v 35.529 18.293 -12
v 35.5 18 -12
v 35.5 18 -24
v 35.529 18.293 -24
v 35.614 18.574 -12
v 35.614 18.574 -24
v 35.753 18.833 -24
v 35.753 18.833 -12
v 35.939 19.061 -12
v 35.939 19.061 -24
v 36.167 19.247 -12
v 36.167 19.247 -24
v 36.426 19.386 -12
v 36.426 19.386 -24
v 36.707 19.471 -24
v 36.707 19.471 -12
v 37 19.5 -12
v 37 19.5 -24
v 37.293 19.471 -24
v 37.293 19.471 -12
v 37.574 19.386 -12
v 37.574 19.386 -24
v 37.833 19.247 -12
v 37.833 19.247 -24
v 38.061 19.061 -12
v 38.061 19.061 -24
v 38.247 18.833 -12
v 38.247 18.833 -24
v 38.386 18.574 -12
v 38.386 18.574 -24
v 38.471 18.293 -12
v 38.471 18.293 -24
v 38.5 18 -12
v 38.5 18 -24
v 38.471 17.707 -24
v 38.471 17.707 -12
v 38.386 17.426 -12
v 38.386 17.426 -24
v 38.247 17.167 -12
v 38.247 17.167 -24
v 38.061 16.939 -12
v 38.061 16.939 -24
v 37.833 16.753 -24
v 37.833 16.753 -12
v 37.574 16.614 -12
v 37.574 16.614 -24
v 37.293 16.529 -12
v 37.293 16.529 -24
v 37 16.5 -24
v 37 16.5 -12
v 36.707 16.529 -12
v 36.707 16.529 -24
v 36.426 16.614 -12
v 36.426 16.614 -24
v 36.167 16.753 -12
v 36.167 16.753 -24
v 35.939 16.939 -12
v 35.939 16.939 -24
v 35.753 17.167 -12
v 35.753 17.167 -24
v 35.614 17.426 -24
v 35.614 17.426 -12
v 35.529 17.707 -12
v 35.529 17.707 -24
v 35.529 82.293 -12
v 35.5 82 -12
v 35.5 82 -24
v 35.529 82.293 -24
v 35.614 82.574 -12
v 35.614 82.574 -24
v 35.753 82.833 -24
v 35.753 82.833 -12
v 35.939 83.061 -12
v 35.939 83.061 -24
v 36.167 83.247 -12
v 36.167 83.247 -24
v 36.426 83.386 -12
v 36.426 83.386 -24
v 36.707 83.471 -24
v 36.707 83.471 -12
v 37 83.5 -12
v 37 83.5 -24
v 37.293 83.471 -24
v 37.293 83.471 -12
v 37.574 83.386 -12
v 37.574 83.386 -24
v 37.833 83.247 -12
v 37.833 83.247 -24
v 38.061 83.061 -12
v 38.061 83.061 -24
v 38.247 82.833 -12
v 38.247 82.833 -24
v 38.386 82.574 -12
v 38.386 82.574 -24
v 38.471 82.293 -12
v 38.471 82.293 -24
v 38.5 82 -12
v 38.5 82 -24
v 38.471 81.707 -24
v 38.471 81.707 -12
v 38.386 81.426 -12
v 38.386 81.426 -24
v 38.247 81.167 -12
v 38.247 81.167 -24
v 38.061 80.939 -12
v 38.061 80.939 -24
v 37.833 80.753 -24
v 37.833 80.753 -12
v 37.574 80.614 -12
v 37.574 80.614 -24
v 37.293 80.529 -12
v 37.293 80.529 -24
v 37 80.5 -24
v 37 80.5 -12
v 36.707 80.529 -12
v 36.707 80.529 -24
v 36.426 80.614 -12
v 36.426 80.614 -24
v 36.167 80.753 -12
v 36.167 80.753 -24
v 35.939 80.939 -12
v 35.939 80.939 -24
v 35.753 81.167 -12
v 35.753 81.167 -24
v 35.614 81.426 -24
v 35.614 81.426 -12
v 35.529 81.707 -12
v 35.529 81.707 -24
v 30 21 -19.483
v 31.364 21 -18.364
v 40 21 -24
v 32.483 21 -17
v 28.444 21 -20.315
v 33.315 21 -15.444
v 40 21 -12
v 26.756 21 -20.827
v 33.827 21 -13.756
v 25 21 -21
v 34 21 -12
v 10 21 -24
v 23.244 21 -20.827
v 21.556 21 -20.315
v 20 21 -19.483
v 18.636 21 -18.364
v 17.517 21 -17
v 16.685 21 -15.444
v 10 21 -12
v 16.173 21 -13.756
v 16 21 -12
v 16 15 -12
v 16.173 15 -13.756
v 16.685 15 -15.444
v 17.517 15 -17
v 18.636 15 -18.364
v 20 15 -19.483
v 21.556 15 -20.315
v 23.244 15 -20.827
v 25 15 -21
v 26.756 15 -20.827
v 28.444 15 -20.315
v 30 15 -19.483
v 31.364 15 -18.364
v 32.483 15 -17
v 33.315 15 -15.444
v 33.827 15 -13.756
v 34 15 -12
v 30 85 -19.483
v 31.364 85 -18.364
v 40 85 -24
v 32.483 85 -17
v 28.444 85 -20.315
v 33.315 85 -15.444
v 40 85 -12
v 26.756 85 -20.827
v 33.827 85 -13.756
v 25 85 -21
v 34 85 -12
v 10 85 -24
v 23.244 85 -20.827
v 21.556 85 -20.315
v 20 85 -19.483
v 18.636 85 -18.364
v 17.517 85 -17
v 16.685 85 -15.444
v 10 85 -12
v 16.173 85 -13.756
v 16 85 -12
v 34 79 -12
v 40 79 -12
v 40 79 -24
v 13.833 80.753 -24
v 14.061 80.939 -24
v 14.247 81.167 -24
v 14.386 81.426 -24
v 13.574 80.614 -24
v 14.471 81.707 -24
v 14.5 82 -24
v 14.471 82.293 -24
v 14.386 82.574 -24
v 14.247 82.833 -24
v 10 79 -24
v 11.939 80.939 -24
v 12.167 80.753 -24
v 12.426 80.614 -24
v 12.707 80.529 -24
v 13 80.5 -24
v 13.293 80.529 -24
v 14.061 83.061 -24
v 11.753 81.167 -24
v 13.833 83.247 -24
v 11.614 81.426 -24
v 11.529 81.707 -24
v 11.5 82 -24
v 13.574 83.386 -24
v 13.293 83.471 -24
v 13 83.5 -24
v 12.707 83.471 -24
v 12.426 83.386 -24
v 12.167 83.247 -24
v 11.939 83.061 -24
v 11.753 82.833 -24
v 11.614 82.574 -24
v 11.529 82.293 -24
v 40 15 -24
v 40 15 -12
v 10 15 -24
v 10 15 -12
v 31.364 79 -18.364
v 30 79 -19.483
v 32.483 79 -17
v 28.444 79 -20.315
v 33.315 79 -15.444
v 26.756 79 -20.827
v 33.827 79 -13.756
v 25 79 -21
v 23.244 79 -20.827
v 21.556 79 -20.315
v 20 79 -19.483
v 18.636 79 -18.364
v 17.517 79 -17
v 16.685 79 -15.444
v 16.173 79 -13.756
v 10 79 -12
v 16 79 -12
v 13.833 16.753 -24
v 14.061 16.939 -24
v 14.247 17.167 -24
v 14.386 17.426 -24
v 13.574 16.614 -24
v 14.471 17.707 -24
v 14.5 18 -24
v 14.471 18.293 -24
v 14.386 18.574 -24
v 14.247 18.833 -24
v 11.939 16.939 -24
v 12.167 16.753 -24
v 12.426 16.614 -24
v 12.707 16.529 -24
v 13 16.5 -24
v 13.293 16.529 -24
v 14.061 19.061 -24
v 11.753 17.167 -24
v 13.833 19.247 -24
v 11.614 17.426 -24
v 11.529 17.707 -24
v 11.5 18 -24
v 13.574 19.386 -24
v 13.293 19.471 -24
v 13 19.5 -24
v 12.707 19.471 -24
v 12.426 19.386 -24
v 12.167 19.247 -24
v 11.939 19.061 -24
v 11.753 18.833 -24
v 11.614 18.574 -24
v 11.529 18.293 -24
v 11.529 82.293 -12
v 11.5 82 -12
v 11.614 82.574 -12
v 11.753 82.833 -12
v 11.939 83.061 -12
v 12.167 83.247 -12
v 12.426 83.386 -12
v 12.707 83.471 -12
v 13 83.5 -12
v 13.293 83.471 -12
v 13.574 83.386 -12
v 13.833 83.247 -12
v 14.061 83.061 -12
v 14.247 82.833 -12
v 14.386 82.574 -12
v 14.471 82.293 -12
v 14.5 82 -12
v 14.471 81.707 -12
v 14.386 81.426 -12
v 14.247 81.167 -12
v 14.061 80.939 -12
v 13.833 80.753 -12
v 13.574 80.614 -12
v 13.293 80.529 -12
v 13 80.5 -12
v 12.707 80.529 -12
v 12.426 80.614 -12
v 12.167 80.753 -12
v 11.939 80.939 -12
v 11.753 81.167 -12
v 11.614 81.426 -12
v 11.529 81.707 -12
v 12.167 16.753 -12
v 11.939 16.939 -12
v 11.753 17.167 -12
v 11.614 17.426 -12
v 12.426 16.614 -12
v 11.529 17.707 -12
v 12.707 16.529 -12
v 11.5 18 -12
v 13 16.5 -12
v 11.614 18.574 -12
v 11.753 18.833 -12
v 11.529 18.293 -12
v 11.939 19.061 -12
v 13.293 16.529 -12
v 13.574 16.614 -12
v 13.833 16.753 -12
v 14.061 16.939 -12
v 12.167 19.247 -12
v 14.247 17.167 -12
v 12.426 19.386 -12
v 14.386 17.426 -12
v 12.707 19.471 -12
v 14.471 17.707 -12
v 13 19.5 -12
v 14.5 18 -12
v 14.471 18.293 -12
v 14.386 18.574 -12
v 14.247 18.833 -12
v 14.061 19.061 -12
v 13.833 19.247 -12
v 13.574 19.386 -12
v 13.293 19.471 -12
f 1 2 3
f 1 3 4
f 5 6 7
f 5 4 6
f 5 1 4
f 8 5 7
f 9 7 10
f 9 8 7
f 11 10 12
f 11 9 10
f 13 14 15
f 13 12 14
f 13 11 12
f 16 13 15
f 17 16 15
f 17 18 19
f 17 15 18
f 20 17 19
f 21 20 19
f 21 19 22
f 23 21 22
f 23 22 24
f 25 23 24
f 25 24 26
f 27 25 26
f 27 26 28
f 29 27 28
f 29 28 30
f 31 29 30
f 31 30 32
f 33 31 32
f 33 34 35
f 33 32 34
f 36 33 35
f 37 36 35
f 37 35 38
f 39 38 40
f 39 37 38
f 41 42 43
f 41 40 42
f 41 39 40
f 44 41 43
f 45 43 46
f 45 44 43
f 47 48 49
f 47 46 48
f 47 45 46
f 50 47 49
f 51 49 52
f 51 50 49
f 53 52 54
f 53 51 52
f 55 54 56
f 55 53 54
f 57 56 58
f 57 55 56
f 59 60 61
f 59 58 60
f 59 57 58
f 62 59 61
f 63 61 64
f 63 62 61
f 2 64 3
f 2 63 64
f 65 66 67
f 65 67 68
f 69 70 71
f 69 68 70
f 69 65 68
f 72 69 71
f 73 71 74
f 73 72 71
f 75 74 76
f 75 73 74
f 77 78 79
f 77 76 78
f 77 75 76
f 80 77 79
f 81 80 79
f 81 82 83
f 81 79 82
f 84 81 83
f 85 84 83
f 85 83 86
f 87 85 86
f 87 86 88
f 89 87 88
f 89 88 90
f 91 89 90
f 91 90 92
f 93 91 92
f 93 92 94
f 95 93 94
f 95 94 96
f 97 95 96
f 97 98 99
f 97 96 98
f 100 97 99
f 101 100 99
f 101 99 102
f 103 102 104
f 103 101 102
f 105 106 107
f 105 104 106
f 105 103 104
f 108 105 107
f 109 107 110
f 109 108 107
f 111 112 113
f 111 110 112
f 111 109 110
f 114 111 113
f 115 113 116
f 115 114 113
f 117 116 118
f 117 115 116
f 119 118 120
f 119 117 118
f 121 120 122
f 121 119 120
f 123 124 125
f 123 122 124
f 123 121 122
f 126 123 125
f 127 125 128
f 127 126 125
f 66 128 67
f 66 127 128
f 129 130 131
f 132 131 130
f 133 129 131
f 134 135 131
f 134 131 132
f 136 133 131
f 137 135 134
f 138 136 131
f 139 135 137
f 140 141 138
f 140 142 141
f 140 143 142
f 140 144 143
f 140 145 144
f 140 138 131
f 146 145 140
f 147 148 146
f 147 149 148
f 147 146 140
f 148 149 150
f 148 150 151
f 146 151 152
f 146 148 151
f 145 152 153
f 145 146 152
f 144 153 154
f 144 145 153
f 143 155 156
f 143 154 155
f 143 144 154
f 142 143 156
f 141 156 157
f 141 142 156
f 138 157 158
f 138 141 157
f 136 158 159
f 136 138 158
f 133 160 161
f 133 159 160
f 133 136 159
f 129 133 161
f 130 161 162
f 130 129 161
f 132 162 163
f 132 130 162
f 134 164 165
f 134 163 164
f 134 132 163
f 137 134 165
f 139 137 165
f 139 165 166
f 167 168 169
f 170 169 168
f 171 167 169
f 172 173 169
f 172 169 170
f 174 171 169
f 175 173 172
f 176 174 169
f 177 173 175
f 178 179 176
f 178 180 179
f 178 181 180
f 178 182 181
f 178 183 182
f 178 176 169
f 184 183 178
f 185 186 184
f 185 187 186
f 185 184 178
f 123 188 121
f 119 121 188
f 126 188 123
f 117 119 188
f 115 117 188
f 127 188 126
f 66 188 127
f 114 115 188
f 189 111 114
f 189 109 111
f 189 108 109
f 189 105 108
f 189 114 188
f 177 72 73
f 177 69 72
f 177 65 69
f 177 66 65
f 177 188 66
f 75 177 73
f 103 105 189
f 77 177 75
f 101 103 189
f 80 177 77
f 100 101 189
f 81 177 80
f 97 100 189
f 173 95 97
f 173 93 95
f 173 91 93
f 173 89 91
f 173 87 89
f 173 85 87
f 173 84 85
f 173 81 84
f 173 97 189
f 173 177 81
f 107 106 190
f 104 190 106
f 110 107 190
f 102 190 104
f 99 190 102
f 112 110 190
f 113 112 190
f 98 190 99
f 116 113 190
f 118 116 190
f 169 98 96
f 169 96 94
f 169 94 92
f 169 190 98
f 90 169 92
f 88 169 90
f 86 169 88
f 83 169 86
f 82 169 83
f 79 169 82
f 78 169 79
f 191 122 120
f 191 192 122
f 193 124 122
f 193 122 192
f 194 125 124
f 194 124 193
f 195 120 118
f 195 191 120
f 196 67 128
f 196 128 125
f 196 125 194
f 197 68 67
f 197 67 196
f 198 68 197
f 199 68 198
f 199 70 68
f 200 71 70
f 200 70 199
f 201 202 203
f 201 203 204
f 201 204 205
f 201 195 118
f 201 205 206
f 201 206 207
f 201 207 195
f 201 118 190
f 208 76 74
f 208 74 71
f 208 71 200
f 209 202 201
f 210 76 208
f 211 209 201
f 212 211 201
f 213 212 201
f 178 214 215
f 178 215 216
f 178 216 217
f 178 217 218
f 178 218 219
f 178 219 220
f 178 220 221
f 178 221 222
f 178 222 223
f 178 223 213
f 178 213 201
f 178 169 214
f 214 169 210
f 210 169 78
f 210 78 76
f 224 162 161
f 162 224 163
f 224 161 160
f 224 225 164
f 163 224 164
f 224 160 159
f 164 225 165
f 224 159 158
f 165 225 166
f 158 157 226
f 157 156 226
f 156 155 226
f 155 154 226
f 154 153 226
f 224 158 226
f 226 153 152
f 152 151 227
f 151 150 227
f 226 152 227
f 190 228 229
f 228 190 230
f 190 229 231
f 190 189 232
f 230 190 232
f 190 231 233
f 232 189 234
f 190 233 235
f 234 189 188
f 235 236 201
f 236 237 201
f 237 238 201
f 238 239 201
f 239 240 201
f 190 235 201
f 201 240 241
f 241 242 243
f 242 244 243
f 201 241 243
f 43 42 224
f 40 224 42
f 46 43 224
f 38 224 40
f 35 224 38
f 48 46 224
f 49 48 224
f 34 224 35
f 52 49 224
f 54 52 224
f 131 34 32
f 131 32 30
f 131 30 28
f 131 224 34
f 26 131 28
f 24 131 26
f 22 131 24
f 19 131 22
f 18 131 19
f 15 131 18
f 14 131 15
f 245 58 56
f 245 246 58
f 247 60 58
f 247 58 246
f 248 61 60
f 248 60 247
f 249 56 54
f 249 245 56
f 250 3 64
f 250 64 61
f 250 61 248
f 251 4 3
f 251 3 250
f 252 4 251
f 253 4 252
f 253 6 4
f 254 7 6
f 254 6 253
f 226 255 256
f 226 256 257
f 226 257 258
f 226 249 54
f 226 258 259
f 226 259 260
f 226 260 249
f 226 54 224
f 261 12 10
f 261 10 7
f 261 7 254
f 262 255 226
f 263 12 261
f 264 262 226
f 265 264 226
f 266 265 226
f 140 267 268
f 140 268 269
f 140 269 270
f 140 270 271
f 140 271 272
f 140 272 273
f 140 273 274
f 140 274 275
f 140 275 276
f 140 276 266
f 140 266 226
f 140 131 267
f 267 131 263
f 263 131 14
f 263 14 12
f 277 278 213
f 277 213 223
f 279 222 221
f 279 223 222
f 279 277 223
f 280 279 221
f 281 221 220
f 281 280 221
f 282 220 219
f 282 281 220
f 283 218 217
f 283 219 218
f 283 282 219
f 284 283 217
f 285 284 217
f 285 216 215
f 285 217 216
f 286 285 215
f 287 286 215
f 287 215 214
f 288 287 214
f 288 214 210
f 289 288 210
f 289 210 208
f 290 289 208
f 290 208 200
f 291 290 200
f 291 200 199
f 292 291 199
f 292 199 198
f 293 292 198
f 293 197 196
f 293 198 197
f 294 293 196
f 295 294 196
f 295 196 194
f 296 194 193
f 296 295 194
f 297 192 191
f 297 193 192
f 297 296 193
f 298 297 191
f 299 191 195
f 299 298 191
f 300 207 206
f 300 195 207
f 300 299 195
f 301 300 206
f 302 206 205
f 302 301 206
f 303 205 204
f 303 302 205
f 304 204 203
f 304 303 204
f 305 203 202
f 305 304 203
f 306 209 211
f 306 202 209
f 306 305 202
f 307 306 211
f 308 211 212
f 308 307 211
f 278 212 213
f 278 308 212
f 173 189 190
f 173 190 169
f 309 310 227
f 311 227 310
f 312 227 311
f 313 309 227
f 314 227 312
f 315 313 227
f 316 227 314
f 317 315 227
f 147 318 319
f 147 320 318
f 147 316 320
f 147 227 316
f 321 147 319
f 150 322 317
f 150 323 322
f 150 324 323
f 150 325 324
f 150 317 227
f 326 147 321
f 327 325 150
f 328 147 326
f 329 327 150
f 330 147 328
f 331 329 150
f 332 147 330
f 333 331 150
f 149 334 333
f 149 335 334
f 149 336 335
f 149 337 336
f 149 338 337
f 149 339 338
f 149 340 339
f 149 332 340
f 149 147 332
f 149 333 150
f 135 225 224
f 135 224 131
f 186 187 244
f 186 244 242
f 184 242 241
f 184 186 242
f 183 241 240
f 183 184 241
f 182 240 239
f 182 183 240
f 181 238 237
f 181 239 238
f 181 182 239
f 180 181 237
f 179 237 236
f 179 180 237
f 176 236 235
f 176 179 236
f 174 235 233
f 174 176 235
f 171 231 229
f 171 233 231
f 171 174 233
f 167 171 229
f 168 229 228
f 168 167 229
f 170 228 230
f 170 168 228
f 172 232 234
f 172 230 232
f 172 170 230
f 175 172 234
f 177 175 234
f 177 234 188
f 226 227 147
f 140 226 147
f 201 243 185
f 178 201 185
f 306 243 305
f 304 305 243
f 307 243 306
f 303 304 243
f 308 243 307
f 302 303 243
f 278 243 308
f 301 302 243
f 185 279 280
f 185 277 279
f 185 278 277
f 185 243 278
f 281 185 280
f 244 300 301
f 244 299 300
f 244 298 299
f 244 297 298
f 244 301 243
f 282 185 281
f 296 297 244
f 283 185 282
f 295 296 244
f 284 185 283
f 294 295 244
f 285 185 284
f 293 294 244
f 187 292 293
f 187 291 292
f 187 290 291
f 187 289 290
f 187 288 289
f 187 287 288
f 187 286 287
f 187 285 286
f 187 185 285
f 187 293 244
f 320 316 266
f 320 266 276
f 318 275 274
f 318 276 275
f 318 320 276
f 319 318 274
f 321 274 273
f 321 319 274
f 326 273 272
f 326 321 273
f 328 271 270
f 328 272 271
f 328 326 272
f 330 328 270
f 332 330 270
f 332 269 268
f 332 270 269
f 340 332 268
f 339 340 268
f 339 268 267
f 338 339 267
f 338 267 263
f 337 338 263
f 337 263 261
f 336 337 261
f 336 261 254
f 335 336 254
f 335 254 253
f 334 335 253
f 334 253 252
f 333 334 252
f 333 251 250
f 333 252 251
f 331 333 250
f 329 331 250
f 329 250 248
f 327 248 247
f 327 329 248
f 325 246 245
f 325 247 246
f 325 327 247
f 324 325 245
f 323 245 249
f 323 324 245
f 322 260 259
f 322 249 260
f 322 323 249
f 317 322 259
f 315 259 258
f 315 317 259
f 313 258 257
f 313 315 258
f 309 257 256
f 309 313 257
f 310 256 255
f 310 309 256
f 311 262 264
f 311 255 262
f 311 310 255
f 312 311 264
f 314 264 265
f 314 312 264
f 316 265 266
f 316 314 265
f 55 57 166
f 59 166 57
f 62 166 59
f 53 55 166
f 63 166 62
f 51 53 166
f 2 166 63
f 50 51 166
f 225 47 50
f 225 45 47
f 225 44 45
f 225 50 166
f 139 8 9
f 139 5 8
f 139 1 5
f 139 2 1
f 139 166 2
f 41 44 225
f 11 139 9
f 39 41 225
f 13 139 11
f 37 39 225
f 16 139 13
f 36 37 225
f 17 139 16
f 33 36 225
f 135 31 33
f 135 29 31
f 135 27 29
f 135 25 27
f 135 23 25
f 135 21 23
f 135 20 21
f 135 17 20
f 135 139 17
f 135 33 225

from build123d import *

# Parameters (mm, degrees)
SKETCH1_W               = 50
SKETCH1_H               = 100
BOSS_EXTRUDE1_DEPTH     = 30
SKETCH2_W               = 42
SKETCH2_H               = 92
CUT_EXTRUDE1_DEPTH      = 26
SKETCH3_W               = 30
SKETCH3_H               = 6
BOSS_EXTRUDE2_DEPTH     = 24
CUT_EXTRUDE2_DEPTH      = 104.07764064
CUT_EXTRUDE2_DEPTH_BACK = 104.07764064
SKETCH4_R               = 9
CUT_EXTRUDE3_DEPTH      = 125.161185561
CUT_EXTRUDE3_DEPTH_BACK = 125.161185561
SKETCH5_R               = 1.5
CUT_EXTRUDE4_DEPTH      = 116.758369028
CUT_EXTRUDE4_DEPTH_BACK = 116.758369028
SKETCH6_W               = 50
SKETCH6_H               = 42


with BuildPart() as part:
    # Sketch1 → Boss-Extrude1 (new body)
    with BuildSketch(Plane.XY):
        with Locations((25, 50)):
            Rectangle(SKETCH1_W, SKETCH1_H)
    extrude(amount=BOSS_EXTRUDE1_DEPTH)

    # Sketch2 → Cut-Extrude1 (cut)
    with BuildSketch(Plane.XY.offset(30)):
        with Locations((25, 50)):
            Rectangle(SKETCH2_W, SKETCH2_H)
    extrude(amount=-CUT_EXTRUDE1_DEPTH, mode=Mode.SUBTRACT)

    # Sketch3 → Boss-Extrude2 (add)
    with BuildSketch(Plane(origin=(0, 0, 0), x_dir=(-1, 0, 0), z_dir=(0, 0, -1))):
        with Locations((-25, 18)):
            Rectangle(SKETCH3_W, SKETCH3_H)
        with Locations((-25, 82)):
            Rectangle(SKETCH3_W, SKETCH3_H)
    extrude(amount=BOSS_EXTRUDE2_DEPTH)

    # Sketch4 → Cut-Extrude2 (cut, two sides: drawn at the far end of the back side and taken through both)
    with BuildSketch(Plane.XZ.offset(-15).offset(-CUT_EXTRUDE2_DEPTH_BACK)):
        with Locations((25, -12)):
            Circle(SKETCH4_R)
    extrude(amount=CUT_EXTRUDE2_DEPTH + CUT_EXTRUDE2_DEPTH_BACK, mode=Mode.SUBTRACT)

    # Sketch5 → Cut-Extrude3 (cut, two sides: drawn at the far end of the back side and taken through both)
    with BuildSketch(Plane(origin=(0, 0, -24), x_dir=(-1, 0, 0), z_dir=(0, 0, -1)).offset(-CUT_EXTRUDE3_DEPTH_BACK)):
        with Locations((-13, 18)):
            Circle(SKETCH5_R)
        with Locations((-37, 18)):
            Circle(SKETCH5_R)
        with Locations((-13, 82)):
            Circle(SKETCH5_R)
        with Locations((-37, 82)):
            Circle(SKETCH5_R)
    extrude(amount=CUT_EXTRUDE3_DEPTH + CUT_EXTRUDE3_DEPTH_BACK, mode=Mode.SUBTRACT)

    # Sketch6 → Cut-Extrude4 (cut, two sides: drawn at the far end of the back side and taken through both)
    with BuildSketch(Plane.XZ.offset(-CUT_EXTRUDE4_DEPTH_BACK)):
        with Locations((25, 9)):
            Rectangle(SKETCH6_W, SKETCH6_H)
    extrude(amount=CUT_EXTRUDE4_DEPTH + CUT_EXTRUDE4_DEPTH_BACK, mode=Mode.SUBTRACT)


with BuildPart() as cut_extrude4_piece_1:
    # of the separate pieces the step leaves, piece 1, a body of its own (cut_extrude4_pieces)
    add(part.part.solids().sort_by_distance((40, 21, -12))[0])


with BuildPart() as cut_extrude4_piece_2:
    # of the separate pieces the step leaves, piece 2, a body of its own (cut_extrude4_pieces)
    add(part.part.solids().sort_by_distance((40, 85, -12))[0])


solid = Compound([cut_extrude4_piece_1.part, cut_extrude4_piece_2.part])
